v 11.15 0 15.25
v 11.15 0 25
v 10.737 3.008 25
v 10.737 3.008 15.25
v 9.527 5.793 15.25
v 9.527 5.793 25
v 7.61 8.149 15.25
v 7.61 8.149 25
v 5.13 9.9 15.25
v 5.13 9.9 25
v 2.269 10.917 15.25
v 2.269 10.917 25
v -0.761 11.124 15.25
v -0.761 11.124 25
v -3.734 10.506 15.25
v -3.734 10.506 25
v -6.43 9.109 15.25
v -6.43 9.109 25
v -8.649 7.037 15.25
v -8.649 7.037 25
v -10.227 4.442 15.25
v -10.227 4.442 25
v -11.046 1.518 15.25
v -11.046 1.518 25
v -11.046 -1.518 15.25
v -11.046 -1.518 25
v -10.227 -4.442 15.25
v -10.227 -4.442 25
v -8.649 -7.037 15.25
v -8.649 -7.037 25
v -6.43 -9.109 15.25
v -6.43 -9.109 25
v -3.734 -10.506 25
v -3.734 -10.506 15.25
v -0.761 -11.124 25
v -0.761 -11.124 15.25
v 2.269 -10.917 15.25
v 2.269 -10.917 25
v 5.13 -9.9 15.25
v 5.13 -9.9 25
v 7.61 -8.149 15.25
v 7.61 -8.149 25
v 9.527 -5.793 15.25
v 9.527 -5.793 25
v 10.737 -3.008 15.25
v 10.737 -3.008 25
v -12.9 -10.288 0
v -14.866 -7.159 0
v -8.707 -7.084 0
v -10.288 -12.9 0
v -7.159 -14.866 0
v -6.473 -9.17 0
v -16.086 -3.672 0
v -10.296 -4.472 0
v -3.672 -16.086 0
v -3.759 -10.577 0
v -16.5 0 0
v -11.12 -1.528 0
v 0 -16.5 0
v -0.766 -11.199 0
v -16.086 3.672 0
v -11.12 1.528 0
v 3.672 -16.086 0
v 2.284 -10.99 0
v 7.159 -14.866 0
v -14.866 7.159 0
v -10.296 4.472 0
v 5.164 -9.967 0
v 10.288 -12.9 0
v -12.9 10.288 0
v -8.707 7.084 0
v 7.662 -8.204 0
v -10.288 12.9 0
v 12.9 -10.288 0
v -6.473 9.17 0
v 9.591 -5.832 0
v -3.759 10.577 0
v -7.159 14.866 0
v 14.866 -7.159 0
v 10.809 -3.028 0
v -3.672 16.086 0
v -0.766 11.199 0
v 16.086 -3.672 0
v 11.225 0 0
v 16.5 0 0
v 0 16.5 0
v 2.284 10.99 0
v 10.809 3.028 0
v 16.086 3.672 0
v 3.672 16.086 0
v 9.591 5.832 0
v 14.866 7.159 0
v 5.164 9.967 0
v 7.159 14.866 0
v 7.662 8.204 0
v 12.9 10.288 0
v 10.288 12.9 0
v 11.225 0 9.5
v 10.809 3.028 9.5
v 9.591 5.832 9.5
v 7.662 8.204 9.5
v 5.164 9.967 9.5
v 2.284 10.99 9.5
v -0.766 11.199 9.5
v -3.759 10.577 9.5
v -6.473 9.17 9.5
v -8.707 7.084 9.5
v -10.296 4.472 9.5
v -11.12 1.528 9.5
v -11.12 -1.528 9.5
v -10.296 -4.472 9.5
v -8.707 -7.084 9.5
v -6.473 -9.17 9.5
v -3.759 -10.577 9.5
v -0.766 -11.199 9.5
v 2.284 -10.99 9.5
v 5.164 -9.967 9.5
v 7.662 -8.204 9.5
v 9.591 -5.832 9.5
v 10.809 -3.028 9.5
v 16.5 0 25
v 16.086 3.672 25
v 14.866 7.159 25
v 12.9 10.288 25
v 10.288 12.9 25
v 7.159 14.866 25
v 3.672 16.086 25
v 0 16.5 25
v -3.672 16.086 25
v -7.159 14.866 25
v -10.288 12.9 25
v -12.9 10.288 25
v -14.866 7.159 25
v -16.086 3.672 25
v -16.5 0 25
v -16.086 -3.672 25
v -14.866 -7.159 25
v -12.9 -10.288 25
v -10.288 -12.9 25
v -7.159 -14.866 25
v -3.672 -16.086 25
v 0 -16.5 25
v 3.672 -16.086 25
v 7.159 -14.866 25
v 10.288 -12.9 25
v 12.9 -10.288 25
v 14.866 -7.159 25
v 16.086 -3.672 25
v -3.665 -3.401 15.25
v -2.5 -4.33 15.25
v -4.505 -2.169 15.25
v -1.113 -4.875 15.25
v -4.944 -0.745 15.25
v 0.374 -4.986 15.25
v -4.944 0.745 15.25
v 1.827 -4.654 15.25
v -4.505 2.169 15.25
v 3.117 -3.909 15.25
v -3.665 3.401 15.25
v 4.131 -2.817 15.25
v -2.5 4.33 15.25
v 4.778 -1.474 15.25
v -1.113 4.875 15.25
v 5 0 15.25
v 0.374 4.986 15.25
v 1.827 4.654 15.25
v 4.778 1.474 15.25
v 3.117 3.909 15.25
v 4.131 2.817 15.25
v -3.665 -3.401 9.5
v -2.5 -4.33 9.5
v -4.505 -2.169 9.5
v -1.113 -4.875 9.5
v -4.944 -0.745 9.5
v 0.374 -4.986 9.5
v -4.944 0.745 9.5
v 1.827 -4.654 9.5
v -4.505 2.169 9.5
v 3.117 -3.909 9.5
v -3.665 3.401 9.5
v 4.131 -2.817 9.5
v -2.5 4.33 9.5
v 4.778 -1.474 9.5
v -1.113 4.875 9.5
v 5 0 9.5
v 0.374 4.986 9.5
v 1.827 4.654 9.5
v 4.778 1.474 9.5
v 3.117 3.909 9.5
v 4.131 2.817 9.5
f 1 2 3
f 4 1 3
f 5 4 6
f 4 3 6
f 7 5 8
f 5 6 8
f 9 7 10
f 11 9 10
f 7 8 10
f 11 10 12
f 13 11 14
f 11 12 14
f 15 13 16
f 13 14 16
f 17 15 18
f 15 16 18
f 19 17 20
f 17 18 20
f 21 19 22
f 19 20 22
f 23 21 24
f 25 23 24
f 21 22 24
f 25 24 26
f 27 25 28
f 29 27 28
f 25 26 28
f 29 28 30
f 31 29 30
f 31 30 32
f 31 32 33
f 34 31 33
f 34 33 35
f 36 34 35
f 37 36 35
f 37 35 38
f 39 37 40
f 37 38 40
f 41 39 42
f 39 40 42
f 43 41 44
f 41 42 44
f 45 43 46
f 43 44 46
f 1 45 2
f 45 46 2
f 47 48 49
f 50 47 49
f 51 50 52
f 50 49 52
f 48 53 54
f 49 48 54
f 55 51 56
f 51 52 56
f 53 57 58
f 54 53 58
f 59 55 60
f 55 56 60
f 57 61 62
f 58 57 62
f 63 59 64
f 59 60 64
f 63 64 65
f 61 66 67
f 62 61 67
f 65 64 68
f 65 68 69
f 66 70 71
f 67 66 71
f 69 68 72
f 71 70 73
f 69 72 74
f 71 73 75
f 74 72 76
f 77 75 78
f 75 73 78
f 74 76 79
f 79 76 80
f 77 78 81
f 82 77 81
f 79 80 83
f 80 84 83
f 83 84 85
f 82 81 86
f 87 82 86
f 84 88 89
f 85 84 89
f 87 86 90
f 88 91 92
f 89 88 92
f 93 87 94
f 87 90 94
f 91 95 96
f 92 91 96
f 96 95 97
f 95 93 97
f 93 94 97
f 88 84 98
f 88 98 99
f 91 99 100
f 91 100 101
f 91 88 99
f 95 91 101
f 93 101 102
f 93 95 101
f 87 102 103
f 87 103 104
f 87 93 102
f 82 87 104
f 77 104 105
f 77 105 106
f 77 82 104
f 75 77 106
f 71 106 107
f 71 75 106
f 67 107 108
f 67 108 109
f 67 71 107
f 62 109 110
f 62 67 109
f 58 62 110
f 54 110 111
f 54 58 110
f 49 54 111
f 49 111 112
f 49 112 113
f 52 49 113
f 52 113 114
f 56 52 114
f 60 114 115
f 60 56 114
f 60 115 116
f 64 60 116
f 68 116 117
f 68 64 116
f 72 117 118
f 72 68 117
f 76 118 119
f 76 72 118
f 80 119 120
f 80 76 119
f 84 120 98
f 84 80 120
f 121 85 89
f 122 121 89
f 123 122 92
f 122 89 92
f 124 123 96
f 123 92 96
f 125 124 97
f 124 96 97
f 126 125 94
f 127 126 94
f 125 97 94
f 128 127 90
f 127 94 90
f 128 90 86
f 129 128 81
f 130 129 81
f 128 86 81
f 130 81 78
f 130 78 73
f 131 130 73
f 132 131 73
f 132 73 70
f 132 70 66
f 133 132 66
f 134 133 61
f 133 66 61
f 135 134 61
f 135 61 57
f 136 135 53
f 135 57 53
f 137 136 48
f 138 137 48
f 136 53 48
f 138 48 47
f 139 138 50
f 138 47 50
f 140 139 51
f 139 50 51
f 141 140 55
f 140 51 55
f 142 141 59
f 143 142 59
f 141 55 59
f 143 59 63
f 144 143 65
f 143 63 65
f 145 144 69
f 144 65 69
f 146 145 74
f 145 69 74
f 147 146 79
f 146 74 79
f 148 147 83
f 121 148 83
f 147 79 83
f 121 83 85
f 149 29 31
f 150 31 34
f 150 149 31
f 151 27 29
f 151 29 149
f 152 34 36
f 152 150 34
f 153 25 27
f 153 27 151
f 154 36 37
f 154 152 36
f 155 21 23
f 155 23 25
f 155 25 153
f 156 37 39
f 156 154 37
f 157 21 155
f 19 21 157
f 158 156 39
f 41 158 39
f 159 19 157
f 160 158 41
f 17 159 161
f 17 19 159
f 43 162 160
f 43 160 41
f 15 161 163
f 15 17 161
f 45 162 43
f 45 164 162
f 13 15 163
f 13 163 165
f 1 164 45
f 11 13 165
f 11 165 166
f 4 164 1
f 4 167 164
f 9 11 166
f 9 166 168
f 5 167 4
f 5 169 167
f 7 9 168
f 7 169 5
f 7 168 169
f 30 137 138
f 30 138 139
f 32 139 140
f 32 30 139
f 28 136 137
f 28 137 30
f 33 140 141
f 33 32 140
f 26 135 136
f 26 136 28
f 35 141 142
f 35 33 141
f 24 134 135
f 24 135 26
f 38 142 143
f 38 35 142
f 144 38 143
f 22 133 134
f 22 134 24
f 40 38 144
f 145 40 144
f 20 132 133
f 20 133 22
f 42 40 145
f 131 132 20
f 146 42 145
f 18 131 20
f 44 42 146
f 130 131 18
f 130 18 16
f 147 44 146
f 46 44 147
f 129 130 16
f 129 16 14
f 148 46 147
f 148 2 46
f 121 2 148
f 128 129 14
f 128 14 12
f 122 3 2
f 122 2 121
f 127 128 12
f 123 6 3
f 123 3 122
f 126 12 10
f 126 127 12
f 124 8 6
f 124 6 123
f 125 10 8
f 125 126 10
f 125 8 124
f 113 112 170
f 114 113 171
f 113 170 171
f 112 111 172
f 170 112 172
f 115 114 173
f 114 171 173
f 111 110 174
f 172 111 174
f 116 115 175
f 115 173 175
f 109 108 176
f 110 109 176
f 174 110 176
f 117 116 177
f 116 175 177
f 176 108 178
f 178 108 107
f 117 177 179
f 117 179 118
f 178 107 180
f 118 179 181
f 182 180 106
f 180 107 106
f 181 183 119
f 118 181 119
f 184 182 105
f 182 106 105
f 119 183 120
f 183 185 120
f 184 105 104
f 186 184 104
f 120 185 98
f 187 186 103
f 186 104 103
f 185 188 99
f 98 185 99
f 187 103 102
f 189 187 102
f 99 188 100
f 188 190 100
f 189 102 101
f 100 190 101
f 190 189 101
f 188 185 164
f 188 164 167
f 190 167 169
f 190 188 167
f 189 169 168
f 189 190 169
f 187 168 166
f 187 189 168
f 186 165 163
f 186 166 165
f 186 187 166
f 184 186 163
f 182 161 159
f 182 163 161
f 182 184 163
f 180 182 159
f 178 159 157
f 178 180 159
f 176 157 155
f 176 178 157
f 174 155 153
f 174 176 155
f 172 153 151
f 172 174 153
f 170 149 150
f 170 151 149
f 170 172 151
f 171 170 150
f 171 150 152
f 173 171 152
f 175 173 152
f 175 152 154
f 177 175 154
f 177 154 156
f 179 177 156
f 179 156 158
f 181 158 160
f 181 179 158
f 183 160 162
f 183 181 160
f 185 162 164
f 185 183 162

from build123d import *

# Parameters (mm, degrees)
F0_R     = 16.5
F0_R_2   = 5
F1_DEPTH = 25
F2_R     = 11.15
F3_DEPTH = 9.75
F4_R     = 11.225
F5_DEPTH = 9.5


with BuildPart() as f1:
    # F0 (on Top) → F1 (new body)
    with BuildSketch(Plane.XY):
        Circle(F0_R)
        Circle(F0_R_2, mode=Mode.SUBTRACT)
    extrude(amount=F1_DEPTH)

    # F2 (on face) → F3 (cut)
    with BuildSketch(Plane.XY.offset(25)):
        Circle(F2_R)
    extrude(amount=-F3_DEPTH, mode=Mode.SUBTRACT)

    # F4 (on Top) → F5 (cut)
    with BuildSketch(Plane.XY):
        Circle(F4_R)
    extrude(amount=F5_DEPTH, mode=Mode.SUBTRACT)


solid = f1.part
